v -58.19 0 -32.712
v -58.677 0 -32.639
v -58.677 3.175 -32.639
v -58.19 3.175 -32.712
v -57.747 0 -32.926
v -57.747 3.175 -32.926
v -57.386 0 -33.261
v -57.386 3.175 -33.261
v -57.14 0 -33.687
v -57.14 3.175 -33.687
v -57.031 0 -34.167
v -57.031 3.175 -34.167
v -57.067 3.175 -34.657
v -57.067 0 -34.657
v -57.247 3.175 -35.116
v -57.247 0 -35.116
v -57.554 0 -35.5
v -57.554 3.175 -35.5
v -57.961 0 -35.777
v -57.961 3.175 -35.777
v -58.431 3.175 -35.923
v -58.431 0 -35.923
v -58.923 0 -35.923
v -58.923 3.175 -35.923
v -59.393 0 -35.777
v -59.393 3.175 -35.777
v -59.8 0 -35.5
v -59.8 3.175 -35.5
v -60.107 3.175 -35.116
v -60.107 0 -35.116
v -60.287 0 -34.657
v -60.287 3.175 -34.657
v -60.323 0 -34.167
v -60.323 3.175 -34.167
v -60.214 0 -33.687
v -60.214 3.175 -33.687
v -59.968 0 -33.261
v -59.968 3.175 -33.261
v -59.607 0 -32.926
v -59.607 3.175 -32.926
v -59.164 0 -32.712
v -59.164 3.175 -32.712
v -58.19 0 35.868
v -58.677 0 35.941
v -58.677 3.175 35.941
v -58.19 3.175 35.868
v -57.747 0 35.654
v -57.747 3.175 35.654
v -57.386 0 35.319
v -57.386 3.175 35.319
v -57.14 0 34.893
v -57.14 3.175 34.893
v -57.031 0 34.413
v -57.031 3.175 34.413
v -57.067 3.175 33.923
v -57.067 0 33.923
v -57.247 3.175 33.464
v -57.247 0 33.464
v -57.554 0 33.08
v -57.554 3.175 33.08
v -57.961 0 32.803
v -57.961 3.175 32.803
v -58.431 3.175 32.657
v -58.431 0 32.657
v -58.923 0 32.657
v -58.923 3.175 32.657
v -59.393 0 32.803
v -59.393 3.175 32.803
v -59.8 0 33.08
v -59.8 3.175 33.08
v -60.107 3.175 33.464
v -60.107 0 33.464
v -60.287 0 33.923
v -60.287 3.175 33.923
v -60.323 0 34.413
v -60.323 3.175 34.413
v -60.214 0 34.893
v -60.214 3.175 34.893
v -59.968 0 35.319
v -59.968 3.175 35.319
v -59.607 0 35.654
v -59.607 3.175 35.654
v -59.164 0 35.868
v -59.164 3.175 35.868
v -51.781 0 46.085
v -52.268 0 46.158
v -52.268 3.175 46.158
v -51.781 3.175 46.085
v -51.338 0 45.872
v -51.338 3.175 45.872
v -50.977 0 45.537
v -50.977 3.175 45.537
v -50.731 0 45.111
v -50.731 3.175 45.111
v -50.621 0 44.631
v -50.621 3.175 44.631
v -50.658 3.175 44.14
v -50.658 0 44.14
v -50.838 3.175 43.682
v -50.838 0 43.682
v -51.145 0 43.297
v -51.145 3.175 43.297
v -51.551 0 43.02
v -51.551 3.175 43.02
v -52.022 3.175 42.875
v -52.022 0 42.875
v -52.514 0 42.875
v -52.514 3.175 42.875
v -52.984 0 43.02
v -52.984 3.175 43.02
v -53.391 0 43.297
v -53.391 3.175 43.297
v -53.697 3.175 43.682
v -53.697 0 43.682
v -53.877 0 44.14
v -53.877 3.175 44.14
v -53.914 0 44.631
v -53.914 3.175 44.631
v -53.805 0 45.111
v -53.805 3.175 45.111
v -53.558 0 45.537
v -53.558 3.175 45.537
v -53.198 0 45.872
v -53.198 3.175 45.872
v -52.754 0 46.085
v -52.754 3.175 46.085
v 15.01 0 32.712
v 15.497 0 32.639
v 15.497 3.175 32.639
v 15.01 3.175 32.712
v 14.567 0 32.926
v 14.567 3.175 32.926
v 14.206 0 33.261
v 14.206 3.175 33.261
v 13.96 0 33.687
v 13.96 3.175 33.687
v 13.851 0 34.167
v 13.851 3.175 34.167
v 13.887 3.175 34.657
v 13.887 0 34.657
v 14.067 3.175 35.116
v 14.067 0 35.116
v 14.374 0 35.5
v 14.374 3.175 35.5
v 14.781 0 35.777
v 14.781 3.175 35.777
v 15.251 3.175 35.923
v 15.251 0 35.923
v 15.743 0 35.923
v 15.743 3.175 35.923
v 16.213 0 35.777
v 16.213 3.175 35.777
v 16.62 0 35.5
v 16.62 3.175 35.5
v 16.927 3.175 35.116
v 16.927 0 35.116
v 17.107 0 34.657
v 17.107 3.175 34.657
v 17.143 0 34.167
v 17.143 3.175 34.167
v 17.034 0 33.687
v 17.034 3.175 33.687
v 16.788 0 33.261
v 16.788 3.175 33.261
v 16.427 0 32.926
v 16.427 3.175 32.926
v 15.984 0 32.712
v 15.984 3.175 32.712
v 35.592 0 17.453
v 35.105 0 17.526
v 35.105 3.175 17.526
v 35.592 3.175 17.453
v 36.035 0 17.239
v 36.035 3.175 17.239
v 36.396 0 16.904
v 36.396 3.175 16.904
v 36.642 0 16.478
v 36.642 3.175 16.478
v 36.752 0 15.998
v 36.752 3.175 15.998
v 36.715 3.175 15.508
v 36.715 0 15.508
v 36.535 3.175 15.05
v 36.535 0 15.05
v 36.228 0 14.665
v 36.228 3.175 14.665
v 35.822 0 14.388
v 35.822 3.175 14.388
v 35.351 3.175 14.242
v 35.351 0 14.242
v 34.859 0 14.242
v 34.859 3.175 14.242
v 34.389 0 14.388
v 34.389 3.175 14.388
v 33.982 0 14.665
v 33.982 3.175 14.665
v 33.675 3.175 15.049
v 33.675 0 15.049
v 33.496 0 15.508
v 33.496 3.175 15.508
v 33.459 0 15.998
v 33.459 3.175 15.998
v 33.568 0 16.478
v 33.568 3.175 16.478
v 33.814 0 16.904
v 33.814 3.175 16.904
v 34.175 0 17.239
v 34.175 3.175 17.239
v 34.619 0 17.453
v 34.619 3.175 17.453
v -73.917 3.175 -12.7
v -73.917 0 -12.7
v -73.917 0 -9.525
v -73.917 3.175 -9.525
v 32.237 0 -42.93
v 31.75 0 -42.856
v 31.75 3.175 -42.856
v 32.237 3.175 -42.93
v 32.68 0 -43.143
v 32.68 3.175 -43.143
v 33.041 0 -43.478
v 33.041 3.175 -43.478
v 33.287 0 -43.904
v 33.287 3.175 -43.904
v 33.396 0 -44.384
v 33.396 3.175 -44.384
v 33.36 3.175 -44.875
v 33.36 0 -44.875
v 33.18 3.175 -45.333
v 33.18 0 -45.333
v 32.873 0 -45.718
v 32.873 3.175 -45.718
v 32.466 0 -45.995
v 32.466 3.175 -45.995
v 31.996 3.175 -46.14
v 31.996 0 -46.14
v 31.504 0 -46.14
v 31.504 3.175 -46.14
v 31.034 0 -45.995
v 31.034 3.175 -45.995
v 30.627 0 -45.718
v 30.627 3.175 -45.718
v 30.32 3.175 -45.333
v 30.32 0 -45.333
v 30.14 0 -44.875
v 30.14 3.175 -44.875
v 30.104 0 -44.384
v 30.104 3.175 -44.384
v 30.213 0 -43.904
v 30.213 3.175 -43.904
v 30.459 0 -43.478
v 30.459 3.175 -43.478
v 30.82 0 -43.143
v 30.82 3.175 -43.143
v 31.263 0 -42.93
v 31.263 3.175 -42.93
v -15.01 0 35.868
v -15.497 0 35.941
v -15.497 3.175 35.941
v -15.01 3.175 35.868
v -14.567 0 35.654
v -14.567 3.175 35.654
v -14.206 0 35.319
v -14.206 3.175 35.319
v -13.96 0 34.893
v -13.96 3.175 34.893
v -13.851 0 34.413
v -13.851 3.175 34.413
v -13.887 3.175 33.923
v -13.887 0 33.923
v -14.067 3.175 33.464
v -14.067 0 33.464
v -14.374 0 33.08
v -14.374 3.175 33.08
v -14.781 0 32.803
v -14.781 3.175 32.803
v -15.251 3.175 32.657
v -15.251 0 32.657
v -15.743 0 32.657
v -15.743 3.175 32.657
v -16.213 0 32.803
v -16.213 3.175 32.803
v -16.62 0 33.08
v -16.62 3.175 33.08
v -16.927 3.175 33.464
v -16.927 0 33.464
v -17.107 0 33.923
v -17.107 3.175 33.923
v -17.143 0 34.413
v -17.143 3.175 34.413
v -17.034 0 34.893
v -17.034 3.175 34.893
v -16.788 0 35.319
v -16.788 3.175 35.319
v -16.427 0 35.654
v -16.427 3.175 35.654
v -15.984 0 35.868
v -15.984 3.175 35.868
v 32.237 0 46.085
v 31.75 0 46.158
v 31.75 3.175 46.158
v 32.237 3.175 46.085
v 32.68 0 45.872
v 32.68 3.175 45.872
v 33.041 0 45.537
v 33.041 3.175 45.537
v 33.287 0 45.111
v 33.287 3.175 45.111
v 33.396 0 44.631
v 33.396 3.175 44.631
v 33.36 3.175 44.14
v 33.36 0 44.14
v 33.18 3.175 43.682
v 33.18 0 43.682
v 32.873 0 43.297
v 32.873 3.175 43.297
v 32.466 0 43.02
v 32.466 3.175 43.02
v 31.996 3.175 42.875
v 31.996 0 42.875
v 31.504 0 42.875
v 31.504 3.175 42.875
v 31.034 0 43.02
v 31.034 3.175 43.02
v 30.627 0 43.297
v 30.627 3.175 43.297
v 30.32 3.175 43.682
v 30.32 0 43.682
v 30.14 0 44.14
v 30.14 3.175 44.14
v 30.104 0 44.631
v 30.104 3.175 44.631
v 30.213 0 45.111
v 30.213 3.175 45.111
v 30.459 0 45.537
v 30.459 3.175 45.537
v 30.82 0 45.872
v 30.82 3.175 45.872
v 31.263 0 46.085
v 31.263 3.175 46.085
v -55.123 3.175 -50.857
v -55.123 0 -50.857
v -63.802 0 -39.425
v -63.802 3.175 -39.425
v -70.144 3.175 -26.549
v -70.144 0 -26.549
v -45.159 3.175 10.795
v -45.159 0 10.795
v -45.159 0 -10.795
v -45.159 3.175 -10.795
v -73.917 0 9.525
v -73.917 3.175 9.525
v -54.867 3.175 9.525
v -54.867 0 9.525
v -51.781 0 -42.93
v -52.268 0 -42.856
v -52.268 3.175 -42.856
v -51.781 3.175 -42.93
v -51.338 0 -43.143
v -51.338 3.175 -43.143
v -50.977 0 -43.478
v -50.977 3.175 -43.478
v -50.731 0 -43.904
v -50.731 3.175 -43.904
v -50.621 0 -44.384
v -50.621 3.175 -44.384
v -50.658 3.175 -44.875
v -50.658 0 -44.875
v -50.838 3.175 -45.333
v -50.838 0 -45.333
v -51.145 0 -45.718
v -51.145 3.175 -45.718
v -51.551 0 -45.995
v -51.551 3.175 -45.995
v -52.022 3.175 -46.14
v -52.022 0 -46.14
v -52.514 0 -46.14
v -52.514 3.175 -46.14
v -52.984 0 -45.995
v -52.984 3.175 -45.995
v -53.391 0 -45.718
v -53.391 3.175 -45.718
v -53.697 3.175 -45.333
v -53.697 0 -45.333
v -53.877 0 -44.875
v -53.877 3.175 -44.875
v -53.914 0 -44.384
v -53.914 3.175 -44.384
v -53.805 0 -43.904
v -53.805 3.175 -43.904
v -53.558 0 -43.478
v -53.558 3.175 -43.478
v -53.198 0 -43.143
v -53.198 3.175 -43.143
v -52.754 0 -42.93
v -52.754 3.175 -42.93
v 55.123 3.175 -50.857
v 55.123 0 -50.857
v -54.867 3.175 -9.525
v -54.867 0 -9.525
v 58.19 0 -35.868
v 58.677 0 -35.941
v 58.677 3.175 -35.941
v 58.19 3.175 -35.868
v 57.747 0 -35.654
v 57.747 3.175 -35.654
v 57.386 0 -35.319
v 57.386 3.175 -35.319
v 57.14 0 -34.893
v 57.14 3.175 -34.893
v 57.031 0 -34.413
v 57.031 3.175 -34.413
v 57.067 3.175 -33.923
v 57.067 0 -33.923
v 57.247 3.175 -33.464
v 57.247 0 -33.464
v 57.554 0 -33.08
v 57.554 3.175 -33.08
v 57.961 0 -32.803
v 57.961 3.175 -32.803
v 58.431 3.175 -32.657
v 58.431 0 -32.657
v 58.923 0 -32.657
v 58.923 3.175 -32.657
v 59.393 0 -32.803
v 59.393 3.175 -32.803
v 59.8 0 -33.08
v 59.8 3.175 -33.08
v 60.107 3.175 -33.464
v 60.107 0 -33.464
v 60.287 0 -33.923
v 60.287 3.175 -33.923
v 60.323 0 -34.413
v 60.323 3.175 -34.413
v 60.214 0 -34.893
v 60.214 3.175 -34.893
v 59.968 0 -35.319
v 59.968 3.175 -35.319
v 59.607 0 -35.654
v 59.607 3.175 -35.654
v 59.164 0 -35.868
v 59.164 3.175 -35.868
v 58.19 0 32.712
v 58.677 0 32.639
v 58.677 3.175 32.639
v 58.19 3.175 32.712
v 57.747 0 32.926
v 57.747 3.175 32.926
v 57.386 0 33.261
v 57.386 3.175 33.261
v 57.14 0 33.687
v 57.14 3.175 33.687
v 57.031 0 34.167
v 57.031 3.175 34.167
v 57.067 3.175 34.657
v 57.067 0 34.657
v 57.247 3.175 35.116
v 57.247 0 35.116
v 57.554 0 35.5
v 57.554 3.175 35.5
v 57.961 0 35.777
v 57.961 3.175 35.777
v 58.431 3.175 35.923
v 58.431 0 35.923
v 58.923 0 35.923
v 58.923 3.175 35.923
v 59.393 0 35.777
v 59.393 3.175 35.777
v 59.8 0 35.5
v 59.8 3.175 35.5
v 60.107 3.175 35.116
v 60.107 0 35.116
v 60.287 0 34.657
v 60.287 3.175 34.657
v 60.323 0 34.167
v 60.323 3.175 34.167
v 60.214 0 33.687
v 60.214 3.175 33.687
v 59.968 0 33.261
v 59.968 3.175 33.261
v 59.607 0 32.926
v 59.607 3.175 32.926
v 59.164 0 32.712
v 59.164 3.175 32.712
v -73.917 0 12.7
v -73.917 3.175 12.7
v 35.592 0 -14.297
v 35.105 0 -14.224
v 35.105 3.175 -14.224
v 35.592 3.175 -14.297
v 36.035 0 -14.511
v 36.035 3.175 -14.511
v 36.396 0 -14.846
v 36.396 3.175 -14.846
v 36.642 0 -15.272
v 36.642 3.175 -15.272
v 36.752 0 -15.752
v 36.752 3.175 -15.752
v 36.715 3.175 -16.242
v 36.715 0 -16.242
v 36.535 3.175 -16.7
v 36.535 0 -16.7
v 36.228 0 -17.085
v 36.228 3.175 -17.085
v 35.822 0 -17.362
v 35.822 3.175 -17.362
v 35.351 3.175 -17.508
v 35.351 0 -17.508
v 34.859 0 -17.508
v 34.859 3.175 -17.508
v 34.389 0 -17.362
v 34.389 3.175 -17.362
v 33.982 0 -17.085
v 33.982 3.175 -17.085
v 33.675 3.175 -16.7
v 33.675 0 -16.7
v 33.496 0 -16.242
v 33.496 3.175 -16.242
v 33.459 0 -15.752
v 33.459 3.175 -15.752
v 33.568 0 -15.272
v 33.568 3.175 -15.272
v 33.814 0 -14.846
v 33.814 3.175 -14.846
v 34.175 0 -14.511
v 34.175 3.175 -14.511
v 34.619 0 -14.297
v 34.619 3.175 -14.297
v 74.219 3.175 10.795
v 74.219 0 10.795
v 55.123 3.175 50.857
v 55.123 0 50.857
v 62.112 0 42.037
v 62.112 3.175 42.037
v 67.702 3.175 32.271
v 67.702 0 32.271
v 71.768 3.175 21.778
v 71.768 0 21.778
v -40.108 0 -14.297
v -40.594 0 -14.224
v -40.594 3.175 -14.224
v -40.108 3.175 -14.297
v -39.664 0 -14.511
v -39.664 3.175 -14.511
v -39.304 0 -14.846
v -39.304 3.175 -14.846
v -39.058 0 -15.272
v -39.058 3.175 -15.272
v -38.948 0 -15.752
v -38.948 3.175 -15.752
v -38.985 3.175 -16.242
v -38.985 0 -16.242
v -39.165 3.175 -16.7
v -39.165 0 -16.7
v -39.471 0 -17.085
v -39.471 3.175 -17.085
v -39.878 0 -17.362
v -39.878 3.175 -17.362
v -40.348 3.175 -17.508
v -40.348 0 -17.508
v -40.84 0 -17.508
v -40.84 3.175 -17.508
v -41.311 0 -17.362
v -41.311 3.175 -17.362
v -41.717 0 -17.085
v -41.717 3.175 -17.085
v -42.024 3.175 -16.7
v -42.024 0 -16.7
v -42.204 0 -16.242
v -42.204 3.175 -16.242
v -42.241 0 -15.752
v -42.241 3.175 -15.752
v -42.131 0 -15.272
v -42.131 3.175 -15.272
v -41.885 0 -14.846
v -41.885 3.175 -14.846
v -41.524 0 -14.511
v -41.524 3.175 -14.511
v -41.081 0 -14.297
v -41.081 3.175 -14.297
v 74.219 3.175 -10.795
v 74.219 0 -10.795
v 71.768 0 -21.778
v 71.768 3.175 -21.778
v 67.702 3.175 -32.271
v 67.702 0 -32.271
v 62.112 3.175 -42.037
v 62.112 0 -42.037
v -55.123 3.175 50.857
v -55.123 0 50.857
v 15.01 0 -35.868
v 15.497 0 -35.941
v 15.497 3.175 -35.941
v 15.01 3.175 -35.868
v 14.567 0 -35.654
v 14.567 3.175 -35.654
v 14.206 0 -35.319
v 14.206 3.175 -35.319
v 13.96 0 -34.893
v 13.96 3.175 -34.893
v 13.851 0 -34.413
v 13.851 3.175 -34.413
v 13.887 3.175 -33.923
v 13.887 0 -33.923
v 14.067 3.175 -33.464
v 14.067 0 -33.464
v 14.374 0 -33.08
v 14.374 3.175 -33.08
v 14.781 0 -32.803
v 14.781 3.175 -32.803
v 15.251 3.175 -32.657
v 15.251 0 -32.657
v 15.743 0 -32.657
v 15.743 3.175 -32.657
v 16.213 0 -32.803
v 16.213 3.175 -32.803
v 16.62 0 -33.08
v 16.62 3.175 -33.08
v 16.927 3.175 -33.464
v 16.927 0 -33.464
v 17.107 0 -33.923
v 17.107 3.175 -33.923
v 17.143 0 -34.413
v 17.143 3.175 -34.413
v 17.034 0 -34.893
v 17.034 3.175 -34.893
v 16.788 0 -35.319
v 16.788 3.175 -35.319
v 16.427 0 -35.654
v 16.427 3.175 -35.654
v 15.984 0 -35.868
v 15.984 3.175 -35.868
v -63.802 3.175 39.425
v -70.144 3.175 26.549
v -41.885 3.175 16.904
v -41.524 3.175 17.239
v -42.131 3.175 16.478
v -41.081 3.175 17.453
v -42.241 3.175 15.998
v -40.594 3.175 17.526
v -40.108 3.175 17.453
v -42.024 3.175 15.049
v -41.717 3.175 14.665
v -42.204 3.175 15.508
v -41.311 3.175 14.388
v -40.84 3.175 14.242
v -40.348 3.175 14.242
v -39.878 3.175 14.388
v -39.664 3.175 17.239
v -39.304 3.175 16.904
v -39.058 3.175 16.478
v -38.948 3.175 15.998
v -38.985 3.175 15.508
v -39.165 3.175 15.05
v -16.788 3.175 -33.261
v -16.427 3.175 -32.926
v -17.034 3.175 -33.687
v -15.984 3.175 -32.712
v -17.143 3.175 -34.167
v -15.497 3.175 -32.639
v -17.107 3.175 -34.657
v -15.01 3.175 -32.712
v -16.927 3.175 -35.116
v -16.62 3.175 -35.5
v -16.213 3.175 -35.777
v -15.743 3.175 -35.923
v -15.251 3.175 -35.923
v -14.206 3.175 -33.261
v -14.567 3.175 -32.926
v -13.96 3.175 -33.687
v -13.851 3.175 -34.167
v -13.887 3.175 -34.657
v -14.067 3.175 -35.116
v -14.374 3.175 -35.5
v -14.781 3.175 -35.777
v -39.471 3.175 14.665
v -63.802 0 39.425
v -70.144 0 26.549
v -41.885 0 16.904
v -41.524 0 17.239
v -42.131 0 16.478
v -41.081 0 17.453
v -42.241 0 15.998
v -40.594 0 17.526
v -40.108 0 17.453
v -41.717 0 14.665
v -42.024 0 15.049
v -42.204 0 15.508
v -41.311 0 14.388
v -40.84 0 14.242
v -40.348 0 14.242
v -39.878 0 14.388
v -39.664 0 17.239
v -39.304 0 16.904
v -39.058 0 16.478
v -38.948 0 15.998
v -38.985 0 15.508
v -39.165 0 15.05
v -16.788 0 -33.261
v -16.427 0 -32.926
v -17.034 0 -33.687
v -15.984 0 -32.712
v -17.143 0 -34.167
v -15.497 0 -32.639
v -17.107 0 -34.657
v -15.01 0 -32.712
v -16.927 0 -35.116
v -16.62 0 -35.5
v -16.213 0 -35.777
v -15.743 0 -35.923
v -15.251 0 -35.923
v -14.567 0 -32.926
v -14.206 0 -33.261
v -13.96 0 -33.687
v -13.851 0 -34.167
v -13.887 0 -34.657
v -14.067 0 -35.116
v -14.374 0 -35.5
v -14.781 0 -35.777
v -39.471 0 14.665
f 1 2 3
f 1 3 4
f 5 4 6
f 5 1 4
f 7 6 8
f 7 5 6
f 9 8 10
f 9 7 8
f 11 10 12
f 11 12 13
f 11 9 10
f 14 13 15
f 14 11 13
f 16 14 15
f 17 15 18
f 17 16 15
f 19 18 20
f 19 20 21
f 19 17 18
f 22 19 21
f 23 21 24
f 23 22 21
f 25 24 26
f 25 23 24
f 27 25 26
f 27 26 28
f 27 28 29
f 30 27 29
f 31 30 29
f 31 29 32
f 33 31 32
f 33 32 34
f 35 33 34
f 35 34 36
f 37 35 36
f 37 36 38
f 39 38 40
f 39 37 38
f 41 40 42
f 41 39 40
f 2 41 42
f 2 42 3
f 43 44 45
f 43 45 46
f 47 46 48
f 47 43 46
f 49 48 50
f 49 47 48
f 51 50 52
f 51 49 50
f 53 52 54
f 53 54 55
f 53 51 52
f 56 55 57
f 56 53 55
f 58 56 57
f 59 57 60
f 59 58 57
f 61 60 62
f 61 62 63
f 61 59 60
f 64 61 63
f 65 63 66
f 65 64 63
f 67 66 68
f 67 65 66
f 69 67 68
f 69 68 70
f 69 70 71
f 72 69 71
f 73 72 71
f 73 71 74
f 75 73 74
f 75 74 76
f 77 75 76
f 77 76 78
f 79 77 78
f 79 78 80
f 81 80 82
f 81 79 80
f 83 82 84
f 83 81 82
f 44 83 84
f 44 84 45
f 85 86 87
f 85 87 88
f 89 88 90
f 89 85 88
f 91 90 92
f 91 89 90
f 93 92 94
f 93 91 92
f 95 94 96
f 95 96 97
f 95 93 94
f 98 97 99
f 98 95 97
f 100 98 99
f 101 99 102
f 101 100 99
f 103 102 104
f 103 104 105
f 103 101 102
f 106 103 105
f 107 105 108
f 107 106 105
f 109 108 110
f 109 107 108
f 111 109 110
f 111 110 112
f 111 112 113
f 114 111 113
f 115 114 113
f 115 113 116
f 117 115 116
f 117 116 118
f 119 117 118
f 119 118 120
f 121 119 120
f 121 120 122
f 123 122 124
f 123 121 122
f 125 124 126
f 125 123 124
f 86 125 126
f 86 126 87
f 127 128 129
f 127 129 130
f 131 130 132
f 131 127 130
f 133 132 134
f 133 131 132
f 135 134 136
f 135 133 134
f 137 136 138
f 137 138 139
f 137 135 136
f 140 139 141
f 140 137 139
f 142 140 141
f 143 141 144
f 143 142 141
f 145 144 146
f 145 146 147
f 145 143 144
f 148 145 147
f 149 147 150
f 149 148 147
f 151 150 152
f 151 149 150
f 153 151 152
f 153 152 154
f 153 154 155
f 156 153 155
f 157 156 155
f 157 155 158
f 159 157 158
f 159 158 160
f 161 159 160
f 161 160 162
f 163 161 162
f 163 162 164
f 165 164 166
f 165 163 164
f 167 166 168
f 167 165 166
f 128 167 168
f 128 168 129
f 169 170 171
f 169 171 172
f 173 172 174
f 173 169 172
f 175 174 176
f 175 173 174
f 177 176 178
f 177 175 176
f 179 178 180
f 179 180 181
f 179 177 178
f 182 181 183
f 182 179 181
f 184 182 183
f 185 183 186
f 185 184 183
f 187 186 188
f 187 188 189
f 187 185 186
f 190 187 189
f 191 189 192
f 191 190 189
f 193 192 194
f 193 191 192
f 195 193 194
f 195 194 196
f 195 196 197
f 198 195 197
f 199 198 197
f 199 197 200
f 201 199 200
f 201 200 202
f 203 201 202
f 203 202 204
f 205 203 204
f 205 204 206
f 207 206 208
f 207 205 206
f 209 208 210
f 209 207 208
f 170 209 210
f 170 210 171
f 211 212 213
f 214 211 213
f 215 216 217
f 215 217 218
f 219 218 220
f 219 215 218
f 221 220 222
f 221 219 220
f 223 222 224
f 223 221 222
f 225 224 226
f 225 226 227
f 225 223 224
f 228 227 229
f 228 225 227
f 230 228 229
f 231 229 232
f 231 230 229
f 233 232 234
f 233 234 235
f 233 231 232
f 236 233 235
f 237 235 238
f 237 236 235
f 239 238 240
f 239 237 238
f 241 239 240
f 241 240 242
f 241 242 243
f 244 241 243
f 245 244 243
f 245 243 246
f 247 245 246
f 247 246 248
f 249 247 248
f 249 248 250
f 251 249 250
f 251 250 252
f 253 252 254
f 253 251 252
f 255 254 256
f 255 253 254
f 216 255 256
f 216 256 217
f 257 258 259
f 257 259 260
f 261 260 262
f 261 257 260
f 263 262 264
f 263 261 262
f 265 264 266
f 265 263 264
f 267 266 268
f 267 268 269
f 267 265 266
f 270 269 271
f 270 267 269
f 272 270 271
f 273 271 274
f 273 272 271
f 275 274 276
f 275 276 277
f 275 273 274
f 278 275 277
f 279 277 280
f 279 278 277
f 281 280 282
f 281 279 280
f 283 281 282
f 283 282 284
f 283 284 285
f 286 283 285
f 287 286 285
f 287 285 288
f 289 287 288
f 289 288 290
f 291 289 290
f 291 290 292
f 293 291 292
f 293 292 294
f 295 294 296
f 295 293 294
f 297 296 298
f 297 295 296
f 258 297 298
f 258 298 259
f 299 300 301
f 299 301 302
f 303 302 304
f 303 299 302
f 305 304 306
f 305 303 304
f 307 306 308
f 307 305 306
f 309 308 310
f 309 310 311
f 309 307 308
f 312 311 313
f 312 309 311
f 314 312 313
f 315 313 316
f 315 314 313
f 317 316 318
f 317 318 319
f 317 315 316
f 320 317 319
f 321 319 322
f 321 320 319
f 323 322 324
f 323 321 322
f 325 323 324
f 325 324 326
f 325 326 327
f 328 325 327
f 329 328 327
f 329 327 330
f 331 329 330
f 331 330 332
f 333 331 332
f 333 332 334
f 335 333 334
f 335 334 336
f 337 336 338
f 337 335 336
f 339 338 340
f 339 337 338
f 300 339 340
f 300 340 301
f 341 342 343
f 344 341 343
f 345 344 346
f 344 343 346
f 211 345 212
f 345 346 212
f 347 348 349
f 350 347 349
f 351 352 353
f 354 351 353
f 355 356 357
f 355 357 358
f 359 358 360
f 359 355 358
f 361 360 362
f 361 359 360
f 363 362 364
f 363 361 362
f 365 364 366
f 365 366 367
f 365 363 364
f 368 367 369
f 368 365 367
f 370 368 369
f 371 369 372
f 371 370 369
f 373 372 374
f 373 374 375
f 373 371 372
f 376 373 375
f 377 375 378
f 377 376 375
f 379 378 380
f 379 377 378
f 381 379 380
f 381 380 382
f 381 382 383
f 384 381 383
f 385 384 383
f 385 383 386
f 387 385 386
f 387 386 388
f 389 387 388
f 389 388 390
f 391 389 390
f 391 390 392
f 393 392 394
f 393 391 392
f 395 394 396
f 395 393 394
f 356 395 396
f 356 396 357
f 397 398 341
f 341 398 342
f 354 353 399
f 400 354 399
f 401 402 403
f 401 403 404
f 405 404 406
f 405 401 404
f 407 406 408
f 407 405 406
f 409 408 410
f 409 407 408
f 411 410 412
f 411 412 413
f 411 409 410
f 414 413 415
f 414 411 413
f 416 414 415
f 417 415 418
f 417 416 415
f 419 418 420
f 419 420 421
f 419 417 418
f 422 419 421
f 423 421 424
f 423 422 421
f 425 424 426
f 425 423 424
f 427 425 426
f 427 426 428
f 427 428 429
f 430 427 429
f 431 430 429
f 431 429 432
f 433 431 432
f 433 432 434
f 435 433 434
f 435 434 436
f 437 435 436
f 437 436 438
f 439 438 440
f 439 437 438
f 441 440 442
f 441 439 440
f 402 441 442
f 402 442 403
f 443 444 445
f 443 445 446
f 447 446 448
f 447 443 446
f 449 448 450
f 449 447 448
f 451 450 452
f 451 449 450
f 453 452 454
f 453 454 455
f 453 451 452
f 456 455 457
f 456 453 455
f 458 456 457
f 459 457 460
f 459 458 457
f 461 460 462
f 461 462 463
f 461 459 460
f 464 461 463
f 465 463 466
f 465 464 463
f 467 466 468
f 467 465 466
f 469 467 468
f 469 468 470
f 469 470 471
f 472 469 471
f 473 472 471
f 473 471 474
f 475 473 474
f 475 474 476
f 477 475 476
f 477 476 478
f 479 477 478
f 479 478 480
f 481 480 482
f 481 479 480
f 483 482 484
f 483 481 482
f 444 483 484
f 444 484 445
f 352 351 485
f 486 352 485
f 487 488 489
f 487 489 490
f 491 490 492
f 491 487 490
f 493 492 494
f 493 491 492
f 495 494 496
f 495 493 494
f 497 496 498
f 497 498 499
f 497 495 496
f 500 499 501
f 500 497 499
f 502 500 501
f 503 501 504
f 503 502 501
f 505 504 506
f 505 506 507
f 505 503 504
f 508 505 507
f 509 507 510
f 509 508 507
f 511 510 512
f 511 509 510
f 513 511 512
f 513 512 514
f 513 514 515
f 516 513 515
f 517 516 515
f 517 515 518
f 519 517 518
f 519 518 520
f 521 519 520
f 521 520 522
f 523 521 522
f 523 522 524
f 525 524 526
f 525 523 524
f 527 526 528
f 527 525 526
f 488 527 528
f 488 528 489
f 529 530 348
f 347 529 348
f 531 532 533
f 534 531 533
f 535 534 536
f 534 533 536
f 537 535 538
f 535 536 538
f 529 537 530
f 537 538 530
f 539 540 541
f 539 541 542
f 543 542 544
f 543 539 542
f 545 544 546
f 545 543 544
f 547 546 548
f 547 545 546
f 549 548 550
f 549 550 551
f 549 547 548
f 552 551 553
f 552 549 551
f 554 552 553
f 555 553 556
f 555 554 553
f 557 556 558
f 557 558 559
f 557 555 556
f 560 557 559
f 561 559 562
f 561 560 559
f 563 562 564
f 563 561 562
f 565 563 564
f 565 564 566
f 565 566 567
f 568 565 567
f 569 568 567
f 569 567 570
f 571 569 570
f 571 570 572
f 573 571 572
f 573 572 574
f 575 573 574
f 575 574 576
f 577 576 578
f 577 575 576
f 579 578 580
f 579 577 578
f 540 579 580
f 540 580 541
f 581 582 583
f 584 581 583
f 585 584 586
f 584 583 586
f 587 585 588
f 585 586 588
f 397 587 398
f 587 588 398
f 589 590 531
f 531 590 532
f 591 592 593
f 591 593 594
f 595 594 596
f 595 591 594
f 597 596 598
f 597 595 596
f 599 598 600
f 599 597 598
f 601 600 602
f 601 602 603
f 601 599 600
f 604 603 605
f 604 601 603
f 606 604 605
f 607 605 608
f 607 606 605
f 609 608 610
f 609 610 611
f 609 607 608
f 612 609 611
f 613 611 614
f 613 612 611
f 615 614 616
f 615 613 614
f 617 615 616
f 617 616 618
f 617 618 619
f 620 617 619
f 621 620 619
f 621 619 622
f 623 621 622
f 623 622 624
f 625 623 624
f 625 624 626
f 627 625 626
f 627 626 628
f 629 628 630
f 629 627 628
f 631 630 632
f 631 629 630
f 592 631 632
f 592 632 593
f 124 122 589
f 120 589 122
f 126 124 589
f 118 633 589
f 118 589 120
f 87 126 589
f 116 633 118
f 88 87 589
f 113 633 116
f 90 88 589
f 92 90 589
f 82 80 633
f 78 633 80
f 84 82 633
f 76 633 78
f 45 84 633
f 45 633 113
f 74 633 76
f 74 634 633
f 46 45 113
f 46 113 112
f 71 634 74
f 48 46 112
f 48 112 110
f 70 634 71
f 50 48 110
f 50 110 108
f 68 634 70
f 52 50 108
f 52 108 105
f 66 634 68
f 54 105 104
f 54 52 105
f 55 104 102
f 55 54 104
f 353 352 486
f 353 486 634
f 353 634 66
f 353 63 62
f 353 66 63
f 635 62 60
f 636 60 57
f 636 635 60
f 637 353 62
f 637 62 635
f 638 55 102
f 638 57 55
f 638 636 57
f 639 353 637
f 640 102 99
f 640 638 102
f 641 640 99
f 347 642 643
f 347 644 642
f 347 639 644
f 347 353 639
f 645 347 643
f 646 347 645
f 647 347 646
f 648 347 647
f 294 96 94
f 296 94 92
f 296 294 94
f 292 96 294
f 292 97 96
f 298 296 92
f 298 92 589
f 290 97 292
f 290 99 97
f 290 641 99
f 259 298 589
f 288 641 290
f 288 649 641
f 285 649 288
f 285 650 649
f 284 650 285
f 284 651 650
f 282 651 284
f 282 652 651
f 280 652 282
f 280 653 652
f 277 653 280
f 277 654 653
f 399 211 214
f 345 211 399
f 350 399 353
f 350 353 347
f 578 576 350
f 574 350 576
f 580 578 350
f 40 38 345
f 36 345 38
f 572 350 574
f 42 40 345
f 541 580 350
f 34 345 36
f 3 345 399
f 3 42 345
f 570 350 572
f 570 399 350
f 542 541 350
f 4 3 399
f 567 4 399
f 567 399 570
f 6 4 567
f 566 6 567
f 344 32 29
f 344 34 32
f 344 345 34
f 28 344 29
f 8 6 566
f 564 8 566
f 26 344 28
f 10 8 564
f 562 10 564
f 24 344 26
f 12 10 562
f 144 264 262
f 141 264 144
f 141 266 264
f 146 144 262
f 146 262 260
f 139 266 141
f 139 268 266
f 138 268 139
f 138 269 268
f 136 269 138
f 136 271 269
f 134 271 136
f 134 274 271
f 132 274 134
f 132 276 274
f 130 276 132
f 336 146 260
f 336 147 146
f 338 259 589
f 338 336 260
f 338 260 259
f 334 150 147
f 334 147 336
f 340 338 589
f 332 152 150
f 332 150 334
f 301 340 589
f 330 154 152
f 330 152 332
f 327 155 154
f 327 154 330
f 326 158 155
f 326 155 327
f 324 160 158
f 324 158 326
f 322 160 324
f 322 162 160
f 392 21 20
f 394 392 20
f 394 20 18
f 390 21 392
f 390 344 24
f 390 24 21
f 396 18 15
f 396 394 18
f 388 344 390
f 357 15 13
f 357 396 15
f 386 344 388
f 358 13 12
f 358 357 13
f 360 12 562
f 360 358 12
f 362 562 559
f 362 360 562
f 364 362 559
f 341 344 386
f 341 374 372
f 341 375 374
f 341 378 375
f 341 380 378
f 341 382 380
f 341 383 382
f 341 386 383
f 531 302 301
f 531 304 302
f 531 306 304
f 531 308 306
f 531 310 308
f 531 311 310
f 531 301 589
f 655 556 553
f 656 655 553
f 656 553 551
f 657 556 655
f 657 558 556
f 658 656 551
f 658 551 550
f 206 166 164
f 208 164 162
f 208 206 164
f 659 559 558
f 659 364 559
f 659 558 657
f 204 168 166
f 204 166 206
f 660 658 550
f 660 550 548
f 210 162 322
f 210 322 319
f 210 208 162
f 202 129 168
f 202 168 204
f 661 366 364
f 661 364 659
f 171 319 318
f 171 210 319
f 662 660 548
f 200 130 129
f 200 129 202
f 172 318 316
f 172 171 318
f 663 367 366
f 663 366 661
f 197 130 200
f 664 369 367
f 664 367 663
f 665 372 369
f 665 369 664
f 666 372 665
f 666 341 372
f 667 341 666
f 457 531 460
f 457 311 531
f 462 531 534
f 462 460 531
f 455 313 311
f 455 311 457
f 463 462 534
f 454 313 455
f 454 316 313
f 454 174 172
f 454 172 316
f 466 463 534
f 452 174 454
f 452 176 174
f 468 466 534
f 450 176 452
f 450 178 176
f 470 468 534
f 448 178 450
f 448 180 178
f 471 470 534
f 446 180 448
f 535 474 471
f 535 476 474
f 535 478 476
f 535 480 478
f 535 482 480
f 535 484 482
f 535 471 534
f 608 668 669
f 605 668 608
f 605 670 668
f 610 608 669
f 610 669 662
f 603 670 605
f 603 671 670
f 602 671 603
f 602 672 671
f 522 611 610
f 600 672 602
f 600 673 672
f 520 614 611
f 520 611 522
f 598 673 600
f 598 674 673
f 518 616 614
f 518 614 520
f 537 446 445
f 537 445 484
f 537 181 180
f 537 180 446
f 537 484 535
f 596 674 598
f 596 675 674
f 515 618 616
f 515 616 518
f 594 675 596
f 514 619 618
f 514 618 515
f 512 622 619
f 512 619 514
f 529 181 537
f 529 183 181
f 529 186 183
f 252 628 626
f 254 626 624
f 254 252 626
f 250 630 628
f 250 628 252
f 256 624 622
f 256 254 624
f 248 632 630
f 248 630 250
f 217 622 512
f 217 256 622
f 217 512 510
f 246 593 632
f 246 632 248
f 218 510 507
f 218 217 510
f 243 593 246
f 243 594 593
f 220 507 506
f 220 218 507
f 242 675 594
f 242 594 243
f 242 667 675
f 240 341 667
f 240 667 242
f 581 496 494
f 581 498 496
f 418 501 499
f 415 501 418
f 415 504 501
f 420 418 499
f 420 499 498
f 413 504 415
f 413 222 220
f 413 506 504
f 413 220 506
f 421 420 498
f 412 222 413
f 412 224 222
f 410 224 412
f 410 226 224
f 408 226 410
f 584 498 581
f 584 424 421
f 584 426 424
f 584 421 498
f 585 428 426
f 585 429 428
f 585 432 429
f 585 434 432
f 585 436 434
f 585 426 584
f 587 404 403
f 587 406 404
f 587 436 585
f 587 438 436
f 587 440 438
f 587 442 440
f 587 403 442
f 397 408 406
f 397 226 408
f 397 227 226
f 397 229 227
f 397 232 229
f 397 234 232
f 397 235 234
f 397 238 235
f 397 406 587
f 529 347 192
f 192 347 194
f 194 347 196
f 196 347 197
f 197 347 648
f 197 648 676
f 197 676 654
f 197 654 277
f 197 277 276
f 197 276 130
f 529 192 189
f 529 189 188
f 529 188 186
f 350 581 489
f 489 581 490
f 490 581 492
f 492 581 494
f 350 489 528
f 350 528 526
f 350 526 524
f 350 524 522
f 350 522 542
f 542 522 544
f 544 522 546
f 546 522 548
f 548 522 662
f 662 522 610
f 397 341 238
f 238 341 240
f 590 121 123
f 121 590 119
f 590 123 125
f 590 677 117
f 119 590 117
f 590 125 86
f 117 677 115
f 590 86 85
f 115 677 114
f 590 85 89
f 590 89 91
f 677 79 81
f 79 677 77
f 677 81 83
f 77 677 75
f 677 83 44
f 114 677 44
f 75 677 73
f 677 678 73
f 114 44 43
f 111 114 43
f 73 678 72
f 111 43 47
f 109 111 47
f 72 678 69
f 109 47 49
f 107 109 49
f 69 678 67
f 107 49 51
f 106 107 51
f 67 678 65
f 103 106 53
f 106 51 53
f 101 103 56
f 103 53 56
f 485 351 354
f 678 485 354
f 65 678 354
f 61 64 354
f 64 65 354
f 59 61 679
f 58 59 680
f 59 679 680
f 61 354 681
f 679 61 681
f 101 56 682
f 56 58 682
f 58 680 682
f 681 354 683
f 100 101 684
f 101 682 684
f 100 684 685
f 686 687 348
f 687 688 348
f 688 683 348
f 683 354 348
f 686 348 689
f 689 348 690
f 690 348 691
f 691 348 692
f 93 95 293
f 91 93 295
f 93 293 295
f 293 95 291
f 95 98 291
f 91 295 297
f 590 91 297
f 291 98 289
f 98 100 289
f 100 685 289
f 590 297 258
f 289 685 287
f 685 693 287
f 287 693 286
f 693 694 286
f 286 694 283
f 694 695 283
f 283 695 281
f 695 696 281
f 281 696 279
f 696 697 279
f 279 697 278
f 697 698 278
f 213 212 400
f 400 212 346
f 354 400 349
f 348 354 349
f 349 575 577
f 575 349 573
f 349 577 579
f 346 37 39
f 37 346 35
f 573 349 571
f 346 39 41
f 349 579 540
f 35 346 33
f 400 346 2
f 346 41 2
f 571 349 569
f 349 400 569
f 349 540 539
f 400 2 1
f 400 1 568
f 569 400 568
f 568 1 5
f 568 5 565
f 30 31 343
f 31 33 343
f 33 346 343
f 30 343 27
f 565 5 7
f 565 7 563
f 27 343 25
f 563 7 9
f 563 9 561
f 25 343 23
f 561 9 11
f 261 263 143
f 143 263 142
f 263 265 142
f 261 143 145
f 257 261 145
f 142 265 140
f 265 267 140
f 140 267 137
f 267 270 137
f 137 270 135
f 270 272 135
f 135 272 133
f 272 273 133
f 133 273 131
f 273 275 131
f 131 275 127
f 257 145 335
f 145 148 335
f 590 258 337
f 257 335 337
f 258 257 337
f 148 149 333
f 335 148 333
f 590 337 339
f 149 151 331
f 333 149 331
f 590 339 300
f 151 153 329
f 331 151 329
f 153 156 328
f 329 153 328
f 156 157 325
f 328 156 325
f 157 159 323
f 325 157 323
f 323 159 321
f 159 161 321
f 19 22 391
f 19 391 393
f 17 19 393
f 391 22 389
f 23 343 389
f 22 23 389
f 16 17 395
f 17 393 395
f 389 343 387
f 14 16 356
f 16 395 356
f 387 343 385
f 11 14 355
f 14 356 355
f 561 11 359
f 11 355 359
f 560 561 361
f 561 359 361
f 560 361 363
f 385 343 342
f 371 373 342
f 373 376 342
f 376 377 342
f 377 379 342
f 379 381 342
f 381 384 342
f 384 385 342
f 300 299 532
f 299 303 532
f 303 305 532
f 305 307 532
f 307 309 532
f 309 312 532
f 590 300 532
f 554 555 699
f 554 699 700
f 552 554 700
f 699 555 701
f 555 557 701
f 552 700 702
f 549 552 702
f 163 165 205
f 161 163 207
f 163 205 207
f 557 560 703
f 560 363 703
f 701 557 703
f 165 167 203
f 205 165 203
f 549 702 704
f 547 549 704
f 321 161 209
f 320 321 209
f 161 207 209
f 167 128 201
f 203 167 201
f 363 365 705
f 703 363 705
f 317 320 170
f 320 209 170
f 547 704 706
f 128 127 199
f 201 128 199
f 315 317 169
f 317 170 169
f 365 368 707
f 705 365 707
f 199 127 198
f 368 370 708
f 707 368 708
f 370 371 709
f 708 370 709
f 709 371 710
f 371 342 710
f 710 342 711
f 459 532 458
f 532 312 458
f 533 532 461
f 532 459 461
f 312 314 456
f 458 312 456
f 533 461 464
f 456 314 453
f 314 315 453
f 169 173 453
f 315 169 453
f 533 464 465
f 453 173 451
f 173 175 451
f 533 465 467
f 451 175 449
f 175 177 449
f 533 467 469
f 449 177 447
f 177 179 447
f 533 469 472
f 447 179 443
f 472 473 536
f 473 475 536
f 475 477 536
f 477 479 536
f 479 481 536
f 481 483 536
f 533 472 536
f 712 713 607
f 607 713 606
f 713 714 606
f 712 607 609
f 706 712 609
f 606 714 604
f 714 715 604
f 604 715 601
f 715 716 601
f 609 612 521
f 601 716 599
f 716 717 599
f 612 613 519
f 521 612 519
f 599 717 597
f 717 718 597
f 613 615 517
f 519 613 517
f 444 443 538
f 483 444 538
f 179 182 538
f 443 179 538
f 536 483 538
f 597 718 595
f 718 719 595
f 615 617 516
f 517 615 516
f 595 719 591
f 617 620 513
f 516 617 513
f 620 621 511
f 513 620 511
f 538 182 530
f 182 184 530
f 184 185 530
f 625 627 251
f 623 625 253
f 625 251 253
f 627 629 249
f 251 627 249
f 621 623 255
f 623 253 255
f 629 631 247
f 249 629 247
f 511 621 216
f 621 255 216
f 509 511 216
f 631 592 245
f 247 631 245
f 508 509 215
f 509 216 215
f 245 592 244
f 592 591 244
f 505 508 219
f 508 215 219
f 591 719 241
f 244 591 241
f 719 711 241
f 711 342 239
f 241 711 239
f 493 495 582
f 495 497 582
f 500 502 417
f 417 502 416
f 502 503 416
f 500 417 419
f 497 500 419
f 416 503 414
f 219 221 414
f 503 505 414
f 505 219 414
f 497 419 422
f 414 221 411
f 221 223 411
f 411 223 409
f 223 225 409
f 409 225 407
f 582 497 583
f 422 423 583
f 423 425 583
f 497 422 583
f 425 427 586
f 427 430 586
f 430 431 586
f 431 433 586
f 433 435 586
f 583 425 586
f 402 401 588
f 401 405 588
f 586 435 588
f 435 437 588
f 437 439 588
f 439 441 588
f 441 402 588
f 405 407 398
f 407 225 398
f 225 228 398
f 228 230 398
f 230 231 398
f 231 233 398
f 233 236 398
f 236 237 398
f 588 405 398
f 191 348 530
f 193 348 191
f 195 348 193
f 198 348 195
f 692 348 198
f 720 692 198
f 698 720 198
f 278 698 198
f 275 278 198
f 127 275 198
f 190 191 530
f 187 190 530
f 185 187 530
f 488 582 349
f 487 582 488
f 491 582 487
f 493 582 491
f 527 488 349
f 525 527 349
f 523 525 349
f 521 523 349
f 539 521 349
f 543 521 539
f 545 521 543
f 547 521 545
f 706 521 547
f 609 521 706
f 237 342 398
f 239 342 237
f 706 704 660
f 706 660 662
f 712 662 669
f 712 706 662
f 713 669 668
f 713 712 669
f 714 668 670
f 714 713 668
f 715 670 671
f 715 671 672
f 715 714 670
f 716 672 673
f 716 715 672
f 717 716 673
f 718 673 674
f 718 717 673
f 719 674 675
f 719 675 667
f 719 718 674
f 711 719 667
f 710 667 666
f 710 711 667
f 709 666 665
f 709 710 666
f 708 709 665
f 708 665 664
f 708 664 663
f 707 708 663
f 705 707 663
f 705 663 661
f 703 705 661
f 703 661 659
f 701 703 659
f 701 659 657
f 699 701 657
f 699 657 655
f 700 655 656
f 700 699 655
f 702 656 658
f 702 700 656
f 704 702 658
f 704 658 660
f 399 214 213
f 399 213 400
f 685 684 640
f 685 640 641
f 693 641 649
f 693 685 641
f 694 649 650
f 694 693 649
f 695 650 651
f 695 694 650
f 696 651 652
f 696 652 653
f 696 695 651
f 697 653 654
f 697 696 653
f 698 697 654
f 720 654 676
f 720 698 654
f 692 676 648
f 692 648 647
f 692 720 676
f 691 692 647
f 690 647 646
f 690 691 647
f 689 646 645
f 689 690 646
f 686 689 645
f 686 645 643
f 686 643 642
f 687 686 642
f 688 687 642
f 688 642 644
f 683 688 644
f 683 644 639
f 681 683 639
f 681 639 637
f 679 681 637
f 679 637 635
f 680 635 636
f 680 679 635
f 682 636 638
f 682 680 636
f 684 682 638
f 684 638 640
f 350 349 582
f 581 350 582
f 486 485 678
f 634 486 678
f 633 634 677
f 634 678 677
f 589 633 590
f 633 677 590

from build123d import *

# Parameters (mm, degrees)
SKETCH1_R           = 1.651
BOSS_EXTRUDE1_DEPTH = 3.175
SKETCH2_W           = 19.05
SKETCH2_H           = 19.05
CUT_EXTRUDE1_DEPTH  = 3.175


with BuildPart() as part:
    # Sketch1 → Boss-Extrude1 (new body)
    with BuildSketch(Plane(origin=(0, 0, 0), x_dir=(1, 0, 0), z_dir=(0, 1, 0))):
        with BuildLine():
            Line((-73.916912814, 12.7), (-73.916912814, -12.7))
            ThreePointArc((-73.916912814, -12.7), (-67.281551776, -33.138991997), (-55.122759171, -50.857461806))
            Line((-55.122759171, -50.857461806), (55.122759171, -50.857461806))
            ThreePointArc((55.122759171, -50.857461806), (67.702114955, -32.271095901), (74.219053989, -10.795))
            Line((74.219053989, -10.795), (-45.158734092, -10.795))
            Line((-45.158734092, -10.795), (-45.158734092, 10.795))
            Line((-45.158734092, 10.795), (74.219053989, 10.795))
            ThreePointArc((74.219053989, 10.795), (67.702114955, 32.271095901), (55.122759171, 50.857461806))
            Line((55.122759171, 50.857461806), (-55.122759171, 50.857461806))
            ThreePointArc((-55.122759171, 50.857461806), (-67.281551776, 33.138991997), (-73.916912814, 12.7))
        make_face()
        with Locations(Location((31.75, 44.507461806, 0), (0, 0, 270))):
            Circle(SKETCH1_R, mode=Mode.SUBTRACT)
        with Locations(Location((35.105265908, 15.875, 0), (0, 0, 270))):
            Circle(SKETCH1_R, mode=Mode.SUBTRACT)
        with Locations(Location((35.105265908, -15.875, 0), (0, 0, 270))):
            Circle(SKETCH1_R, mode=Mode.SUBTRACT)
        with Locations(Location((-40.594426833, -15.875, 0), (0, 0, 270))):
            Circle(SKETCH1_R, mode=Mode.SUBTRACT)
        with Locations(Location((-40.594426833, 15.875, 0), (0, 0, 270))):
            Circle(SKETCH1_R, mode=Mode.SUBTRACT)
        with Locations(Location((31.75, -44.507461806, 0), (0, 0, 270))):
            Circle(SKETCH1_R, mode=Mode.SUBTRACT)
        with Locations(Location((-52.26766059, -44.507461806, 0), (0, 0, 270))):
            Circle(SKETCH1_R, mode=Mode.SUBTRACT)
        with Locations(Location((-52.26766059, 44.507461806, 0), (0, 0, 270))):
            Circle(SKETCH1_R, mode=Mode.SUBTRACT)
        with Locations(Location((-58.676912814, 34.29, 0), (0, 0, 270))):
            Circle(SKETCH1_R, mode=Mode.SUBTRACT)
        with Locations(Location((-15.496912814, 34.29, 0), (0, 0, 270))):
            Circle(SKETCH1_R, mode=Mode.SUBTRACT)
        with Locations(Location((-15.496912814, -34.29, 0), (0, 0, 270))):
            Circle(SKETCH1_R, mode=Mode.SUBTRACT)
        with Locations(Location((-58.676912814, -34.29, 0), (0, 0, 270))):
            Circle(SKETCH1_R, mode=Mode.SUBTRACT)
        with Locations(Location((15.496912814, -34.29, 0), (0, 0, 90))):
            Circle(SKETCH1_R, mode=Mode.SUBTRACT)
        with Locations(Location((58.676912814, -34.29, 0), (0, 0, 90))):
            Circle(SKETCH1_R, mode=Mode.SUBTRACT)
        with Locations(Location((58.676912814, 34.29, 0), (0, 0, 90))):
            Circle(SKETCH1_R, mode=Mode.SUBTRACT)
        with Locations(Location((15.496912814, 34.29, 0), (0, 0, 90))):
            Circle(SKETCH1_R, mode=Mode.SUBTRACT)
    extrude(amount=BOSS_EXTRUDE1_DEPTH)

    # Sketch2 → Cut-Extrude1 (cut)
    with BuildSketch(Plane(origin=(0, 3.175, 0), x_dir=(1, 0, 0), z_dir=(0, 1, 0))):
        with Locations((-64.391912814, 0)):
            Rectangle(SKETCH2_W, SKETCH2_H)
    extrude(amount=-CUT_EXTRUDE1_DEPTH, mode=Mode.SUBTRACT)


solid = part.part
